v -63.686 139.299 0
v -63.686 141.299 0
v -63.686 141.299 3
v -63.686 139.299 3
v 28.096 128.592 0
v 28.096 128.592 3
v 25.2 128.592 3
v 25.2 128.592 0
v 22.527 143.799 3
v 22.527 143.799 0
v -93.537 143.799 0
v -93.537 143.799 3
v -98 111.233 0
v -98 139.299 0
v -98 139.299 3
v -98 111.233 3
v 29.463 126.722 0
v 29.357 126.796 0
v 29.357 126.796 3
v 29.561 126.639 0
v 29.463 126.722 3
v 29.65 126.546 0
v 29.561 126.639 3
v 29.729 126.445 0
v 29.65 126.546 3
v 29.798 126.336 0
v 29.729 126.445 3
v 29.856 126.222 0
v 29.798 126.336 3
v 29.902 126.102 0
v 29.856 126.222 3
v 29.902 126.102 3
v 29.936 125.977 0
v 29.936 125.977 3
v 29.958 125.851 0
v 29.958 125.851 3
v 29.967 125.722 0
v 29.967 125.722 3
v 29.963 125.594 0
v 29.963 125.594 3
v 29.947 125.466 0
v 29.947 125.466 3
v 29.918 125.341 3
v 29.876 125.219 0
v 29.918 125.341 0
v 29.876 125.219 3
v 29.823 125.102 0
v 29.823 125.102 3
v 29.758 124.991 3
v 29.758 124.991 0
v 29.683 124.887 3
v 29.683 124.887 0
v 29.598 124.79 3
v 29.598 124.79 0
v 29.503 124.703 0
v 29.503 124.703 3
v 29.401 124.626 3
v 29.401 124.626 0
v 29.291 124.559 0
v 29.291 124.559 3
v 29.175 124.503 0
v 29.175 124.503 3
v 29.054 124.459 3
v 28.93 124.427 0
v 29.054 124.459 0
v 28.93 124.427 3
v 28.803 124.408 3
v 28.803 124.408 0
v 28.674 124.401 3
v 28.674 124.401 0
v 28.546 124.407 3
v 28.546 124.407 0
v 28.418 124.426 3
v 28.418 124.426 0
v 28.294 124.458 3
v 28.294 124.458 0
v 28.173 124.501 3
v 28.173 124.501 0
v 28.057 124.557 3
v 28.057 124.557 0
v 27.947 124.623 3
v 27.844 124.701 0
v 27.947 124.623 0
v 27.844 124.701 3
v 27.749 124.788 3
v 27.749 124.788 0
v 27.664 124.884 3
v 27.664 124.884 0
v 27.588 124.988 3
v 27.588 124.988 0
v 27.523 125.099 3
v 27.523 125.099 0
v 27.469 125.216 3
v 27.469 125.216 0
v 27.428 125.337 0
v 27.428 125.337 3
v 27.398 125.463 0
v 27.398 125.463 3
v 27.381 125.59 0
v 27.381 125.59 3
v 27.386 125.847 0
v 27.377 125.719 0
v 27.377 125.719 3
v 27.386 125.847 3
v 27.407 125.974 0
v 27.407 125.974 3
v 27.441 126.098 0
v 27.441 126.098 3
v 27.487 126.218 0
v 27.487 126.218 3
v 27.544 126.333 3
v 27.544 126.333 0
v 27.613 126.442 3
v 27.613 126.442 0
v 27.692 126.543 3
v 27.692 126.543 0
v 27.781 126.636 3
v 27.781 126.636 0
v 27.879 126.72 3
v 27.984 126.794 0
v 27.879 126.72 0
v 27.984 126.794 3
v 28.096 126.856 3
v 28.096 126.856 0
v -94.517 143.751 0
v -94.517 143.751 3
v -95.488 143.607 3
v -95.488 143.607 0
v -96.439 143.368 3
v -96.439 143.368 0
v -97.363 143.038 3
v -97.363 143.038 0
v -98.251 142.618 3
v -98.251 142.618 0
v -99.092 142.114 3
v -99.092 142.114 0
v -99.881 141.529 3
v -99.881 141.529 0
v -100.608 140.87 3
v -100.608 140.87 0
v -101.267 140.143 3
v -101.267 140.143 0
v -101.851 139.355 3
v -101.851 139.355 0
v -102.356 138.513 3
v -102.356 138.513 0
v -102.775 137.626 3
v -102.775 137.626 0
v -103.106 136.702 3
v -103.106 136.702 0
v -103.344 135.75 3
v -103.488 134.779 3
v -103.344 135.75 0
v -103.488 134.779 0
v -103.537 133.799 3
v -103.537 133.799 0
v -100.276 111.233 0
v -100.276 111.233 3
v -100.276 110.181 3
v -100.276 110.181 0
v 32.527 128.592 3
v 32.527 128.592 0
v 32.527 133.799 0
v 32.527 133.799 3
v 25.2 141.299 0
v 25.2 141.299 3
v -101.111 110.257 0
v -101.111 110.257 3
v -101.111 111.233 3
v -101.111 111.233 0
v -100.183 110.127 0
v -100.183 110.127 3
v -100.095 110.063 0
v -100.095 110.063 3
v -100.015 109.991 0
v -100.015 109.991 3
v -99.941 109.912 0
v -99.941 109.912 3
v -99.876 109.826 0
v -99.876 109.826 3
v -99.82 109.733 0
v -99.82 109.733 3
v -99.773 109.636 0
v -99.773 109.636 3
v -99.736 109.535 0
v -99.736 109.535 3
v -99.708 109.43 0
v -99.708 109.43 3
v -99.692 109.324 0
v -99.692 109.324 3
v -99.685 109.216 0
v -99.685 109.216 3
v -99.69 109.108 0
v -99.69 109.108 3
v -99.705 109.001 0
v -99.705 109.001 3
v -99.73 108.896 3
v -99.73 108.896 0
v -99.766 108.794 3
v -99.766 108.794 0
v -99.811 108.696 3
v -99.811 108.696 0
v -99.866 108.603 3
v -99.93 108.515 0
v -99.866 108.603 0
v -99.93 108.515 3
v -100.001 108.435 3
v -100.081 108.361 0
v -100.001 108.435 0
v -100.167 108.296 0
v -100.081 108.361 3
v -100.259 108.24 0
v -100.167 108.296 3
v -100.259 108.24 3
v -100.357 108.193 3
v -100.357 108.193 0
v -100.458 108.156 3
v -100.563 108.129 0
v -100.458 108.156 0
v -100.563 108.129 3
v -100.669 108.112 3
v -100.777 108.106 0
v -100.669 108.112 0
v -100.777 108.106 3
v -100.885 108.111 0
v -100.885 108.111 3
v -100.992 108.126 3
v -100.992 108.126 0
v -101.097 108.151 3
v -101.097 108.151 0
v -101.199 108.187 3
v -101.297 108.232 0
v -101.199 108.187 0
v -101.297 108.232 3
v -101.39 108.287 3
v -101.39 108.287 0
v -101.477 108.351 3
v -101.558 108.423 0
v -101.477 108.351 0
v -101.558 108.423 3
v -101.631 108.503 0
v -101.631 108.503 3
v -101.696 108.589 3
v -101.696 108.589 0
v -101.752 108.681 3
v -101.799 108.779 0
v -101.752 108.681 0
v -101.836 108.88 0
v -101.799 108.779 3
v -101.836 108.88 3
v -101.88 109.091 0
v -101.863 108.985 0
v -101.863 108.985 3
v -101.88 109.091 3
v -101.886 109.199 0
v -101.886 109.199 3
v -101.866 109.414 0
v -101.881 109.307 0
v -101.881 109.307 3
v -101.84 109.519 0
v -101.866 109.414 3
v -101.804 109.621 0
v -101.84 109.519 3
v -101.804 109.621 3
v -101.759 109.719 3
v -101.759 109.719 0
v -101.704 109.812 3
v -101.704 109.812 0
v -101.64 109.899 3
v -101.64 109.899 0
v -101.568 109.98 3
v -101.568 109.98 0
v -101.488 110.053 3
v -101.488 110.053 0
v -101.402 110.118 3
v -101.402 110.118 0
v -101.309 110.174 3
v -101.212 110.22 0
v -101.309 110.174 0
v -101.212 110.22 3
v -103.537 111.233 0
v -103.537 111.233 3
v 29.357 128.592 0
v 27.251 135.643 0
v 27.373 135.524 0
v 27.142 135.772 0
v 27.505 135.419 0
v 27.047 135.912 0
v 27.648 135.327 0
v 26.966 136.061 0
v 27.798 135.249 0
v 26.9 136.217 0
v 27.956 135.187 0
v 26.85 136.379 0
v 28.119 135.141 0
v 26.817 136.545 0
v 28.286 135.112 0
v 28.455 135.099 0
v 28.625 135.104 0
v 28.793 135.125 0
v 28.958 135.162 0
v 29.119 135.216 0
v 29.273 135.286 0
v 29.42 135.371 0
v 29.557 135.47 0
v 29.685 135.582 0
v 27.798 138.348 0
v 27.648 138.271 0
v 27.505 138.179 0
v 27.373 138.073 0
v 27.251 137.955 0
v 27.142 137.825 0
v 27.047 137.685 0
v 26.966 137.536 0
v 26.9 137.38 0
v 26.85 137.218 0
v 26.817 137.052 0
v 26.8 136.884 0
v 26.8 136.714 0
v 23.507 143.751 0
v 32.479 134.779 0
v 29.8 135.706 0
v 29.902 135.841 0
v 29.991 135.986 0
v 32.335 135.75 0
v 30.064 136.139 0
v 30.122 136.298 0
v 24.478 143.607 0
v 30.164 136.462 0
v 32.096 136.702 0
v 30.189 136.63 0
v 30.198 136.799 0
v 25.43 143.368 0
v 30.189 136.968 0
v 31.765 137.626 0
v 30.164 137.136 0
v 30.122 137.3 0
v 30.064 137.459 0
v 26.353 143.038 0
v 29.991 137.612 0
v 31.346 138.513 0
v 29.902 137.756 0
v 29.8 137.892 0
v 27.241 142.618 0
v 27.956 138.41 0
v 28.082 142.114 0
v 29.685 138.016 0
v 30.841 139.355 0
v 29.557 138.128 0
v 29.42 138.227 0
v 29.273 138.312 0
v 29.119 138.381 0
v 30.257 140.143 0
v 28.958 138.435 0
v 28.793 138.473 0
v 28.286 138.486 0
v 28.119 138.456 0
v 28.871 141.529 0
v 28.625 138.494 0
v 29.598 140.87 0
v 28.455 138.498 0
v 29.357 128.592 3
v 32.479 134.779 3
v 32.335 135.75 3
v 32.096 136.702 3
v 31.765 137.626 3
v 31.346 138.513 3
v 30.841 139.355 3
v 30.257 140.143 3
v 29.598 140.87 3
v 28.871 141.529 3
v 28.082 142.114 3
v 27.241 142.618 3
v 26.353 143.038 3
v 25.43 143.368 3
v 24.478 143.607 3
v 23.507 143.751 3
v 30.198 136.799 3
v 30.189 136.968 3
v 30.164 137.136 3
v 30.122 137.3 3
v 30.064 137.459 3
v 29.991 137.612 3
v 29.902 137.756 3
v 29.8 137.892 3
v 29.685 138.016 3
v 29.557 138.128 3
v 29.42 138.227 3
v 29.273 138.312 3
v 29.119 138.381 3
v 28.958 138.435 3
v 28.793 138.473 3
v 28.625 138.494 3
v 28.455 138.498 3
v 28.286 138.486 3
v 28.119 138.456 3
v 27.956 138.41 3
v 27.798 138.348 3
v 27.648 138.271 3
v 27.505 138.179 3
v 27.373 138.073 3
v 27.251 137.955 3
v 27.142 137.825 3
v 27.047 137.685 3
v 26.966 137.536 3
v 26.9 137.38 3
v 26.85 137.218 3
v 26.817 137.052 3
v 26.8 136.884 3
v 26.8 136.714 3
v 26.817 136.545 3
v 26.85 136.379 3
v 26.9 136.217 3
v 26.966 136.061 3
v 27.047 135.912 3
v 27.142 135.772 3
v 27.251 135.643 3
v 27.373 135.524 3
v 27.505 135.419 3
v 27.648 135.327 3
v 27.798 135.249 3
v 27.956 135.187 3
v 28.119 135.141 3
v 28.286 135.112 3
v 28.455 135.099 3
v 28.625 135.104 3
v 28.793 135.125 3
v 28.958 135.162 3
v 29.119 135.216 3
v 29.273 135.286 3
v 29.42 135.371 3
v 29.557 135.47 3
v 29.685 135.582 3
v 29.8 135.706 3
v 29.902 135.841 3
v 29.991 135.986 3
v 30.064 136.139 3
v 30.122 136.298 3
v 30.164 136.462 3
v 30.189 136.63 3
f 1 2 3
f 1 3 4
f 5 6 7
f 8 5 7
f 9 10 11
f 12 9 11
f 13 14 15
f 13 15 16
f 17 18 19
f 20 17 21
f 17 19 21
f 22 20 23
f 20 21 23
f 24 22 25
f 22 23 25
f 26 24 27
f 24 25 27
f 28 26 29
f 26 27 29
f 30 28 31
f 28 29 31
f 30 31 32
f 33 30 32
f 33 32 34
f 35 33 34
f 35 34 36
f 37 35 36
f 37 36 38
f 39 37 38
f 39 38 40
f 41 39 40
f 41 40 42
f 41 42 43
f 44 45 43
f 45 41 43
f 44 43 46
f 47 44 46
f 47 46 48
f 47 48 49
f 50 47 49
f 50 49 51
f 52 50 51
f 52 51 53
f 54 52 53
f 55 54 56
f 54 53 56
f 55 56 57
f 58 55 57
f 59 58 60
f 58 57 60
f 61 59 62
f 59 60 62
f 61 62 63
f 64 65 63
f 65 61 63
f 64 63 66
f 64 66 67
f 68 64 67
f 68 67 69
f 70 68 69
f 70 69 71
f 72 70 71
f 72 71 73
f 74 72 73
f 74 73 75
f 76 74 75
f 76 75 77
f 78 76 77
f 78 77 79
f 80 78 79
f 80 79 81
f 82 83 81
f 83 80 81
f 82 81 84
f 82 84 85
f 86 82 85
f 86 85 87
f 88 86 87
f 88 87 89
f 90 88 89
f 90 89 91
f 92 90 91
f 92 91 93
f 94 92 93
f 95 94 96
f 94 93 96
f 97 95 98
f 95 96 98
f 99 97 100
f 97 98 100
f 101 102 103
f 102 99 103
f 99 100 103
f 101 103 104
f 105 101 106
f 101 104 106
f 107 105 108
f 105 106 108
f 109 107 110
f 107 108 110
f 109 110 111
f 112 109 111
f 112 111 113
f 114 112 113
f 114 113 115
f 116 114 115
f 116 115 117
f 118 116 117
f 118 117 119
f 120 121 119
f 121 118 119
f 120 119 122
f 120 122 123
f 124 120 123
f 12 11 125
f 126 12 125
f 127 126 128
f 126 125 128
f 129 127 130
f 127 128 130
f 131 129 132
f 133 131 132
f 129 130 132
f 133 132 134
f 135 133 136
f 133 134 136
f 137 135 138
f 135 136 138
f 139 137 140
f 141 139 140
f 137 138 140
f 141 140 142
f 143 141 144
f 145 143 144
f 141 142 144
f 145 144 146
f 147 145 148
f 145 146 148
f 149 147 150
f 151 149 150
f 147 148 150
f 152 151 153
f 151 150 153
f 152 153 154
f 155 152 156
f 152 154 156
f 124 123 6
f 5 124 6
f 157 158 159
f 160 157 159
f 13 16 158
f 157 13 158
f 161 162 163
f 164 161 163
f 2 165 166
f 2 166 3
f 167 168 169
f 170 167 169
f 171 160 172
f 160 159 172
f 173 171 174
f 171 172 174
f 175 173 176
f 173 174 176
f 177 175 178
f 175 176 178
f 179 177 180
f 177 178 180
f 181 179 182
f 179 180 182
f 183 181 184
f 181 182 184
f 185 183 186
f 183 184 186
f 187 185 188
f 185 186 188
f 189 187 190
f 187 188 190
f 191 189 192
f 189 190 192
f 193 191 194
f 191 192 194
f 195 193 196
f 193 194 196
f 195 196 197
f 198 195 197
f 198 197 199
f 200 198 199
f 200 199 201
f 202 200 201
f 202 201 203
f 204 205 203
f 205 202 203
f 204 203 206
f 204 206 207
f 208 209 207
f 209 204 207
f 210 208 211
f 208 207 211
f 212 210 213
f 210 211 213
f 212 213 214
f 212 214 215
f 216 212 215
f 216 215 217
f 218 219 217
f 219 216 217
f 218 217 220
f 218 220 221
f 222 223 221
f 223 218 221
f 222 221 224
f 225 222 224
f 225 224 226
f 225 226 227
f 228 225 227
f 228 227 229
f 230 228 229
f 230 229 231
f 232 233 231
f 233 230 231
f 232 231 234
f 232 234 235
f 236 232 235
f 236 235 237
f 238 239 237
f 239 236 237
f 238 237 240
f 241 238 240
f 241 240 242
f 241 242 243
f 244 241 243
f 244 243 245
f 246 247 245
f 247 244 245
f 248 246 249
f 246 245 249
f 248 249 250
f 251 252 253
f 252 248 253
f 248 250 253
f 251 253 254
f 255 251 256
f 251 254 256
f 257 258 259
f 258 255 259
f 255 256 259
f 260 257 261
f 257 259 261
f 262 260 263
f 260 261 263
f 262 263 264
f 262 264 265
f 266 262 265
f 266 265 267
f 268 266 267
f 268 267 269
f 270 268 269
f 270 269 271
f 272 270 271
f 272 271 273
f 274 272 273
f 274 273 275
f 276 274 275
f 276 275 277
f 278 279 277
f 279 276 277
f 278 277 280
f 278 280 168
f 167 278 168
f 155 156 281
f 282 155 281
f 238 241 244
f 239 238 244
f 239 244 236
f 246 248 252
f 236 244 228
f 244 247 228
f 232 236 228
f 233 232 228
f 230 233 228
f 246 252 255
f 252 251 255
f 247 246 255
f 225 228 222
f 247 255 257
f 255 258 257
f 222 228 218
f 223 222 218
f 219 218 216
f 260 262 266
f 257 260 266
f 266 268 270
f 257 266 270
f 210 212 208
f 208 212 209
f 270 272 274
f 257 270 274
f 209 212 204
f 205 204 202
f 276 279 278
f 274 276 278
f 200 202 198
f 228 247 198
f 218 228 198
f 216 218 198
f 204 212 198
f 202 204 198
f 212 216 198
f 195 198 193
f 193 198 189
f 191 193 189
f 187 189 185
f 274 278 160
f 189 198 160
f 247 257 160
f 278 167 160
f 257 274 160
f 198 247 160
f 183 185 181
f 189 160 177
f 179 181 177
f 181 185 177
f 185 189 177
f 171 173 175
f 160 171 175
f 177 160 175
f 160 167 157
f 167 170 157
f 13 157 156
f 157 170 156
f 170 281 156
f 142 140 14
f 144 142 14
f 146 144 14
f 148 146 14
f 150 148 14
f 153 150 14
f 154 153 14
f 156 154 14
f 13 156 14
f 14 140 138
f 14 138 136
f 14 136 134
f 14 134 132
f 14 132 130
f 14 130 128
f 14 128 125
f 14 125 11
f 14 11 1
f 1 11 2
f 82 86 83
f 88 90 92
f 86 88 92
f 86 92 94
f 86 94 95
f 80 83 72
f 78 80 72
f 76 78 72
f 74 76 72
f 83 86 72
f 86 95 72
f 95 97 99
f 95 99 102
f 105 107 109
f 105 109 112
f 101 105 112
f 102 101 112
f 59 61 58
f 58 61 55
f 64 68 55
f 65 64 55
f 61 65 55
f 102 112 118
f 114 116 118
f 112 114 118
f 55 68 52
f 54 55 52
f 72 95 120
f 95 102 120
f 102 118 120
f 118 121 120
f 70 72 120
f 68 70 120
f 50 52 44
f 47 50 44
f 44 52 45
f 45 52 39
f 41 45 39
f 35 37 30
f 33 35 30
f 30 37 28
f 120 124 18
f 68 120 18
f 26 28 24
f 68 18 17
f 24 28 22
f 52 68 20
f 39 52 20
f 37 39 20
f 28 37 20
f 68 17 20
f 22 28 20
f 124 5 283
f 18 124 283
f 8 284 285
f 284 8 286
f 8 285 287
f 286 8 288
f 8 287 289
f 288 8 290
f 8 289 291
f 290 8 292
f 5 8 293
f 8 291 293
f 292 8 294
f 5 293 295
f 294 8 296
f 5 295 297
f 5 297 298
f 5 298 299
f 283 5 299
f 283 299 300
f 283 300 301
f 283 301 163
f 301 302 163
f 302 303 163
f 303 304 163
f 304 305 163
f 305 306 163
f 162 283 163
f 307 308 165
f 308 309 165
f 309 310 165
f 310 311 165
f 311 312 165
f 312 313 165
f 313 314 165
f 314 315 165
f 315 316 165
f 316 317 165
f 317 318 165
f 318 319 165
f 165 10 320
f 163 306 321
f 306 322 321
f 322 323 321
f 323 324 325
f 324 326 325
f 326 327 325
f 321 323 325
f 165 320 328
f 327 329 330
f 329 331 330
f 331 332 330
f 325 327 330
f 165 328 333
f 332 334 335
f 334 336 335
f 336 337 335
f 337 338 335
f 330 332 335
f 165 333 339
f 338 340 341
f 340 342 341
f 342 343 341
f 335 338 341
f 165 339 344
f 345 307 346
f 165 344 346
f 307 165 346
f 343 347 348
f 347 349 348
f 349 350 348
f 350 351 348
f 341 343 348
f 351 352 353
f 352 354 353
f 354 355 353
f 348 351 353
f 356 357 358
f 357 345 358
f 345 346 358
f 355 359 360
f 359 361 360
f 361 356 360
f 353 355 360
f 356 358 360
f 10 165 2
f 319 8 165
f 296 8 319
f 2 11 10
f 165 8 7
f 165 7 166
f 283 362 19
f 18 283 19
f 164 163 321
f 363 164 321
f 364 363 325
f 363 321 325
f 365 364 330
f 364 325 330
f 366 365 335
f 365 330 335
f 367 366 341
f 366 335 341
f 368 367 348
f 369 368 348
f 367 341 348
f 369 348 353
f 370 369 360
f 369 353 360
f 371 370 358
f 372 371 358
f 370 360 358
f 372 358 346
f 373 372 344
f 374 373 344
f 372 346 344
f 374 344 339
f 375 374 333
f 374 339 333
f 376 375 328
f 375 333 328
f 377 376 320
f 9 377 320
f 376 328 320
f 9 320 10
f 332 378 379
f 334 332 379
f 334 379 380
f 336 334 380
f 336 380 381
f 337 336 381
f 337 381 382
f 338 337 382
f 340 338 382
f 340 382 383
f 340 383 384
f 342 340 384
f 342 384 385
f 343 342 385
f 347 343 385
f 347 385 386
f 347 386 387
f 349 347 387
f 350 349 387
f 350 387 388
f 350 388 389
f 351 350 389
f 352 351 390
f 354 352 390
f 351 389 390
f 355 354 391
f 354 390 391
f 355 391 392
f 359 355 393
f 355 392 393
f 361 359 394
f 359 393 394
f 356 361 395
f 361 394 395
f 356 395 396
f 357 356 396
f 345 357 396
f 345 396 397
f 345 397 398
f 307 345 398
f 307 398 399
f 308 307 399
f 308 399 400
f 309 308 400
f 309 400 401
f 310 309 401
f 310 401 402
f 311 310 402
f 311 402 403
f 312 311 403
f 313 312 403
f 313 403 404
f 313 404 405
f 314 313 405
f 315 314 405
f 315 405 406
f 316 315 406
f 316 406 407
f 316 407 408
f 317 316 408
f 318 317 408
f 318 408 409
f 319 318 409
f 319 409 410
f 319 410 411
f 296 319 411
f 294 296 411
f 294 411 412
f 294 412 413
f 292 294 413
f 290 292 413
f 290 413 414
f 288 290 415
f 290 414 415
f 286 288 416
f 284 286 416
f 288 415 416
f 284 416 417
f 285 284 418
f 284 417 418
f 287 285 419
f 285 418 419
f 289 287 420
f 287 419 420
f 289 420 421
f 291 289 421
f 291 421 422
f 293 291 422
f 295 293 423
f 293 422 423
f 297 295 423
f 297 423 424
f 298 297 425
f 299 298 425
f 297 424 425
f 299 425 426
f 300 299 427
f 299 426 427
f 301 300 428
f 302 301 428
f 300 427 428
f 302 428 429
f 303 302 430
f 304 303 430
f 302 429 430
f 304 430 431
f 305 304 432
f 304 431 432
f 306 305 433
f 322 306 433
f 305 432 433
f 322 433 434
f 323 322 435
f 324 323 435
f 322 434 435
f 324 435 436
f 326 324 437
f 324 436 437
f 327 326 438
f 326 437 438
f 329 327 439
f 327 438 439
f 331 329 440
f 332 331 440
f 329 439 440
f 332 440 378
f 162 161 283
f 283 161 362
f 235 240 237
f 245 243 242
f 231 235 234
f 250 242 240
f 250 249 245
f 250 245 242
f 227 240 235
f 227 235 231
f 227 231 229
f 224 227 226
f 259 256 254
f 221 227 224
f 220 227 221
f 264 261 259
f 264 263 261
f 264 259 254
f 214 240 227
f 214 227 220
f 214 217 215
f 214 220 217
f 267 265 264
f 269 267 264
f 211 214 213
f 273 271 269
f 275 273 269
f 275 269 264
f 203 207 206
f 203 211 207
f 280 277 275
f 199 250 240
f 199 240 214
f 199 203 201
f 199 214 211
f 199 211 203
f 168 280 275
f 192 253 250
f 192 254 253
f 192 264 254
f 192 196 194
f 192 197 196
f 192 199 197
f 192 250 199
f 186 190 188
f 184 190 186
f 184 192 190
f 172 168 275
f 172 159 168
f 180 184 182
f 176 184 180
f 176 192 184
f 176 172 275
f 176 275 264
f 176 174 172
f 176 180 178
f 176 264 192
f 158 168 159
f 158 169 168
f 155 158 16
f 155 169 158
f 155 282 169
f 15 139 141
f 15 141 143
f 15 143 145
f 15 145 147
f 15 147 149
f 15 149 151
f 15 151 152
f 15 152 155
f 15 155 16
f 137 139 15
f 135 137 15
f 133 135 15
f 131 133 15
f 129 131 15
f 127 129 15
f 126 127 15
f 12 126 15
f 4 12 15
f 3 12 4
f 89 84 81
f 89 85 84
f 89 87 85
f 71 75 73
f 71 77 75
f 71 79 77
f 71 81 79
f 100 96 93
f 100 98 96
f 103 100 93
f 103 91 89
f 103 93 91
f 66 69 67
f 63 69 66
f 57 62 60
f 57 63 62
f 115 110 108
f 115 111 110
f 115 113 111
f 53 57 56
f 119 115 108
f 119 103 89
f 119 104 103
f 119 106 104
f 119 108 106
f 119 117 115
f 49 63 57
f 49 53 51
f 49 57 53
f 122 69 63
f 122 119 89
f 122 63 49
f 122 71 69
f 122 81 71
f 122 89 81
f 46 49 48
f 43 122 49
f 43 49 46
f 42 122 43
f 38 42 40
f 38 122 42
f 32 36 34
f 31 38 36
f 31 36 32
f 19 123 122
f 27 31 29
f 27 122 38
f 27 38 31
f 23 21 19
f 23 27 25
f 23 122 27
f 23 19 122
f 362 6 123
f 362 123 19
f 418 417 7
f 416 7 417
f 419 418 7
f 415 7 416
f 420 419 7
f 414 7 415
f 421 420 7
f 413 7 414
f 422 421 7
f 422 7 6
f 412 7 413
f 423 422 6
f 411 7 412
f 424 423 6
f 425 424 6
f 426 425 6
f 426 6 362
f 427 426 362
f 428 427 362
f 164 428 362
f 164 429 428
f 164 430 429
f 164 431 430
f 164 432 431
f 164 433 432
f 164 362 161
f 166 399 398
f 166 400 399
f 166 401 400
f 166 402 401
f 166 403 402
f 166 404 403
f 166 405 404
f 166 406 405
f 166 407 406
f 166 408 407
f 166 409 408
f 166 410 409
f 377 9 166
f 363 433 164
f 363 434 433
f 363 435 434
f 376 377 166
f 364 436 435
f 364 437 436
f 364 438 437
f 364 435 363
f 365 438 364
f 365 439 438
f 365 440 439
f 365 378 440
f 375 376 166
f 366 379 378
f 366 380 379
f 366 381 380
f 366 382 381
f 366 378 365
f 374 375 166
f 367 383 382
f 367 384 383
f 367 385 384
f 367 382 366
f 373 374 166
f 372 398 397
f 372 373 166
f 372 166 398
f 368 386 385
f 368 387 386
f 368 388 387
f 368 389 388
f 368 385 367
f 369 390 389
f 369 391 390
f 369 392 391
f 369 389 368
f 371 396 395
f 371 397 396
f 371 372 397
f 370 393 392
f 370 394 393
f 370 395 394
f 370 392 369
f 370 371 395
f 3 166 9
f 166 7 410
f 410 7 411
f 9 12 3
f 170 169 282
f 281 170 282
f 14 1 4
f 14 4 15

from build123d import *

# Parameters (mm, degrees)
BOSS_EXTRUDE1_DEPTH  = 3
M3_CLEARANCE_HOLE1_D = 3.4
SKETCH2_OUTSIDE_W    = 168.672
SKETCH2_OUTSIDE_H    = 102.608
CUT_EXTRUDE1_DEPTH   = 10


with BuildPart() as part:
    # Sketch1 → Boss-Extrude1 (new body)
    with BuildSketch(Plane.XY):
        with BuildLine():
            Line((-93.536600288, 73.798841742), (22.52665856, 73.798841742))
            ThreePointArc((22.52665856, 73.798841742), (29.597726372, 76.72777393), (32.52665856, 83.798841742))
            Line((32.52665856, 83.798841742), (32.52665856, 133.798841742))
            ThreePointArc((32.52665856, 133.798841742), (29.597726372, 140.869909554), (22.52665856, 143.798841742))
            Line((22.52665856, 143.798841742), (-93.536600288, 143.798841742))
            ThreePointArc((-93.536600288, 143.798841742), (-100.6076681, 140.869909554), (-103.536600288, 133.798841742))
            Line((-103.536600288, 133.798841742), (-103.536600288, 83.798841742))
            ThreePointArc((-103.536600288, 83.798841742), (-100.6076681, 76.72777393), (-93.536600288, 73.798841742))
        make_face()
        Polygon((7.241251279, 79.113754803), (7.241251279, 115.298841742), (25.200464445, 115.298841742), (25.200464445, 141.298841742), (-63.686125174, 141.298841742), (-63.686125174, 139.298841742), (-98, 139.298841742), (-98, 79.113754803), align=None, mode=Mode.SUBTRACT)
    extrude(amount=BOSS_EXTRUDE1_DEPTH)

    # M3 Clearance Hole1 (through all)
    with Locations(Plane(origin=(0, 0, 0), x_dir=(-1, 0, 0), z_dir=(0, 0, -1))):
        with Locations((-28.497536526, 136.798841742), (-28.497536526, 81.798841742)):
            Hole(M3_CLEARANCE_HOLE1_D / 2)

    # Sketch2 outside → Cut-Extrude1 (cut)
    with BuildSketch(Plane.XY.offset(3)):
        with Locations((-35.505, 108.799)):
            Rectangle(SKETCH2_OUTSIDE_W, SKETCH2_OUTSIDE_H)
        with BuildLine():
            Line((-98, 111.232980273), (-100.276015927, 111.232980273))
            Line((-100.276015927, 111.232980273), (-100.276015927, 110.181279495))
            ThreePointArc((-100.276015927, 110.181279495), (-100.885260547, 108.11074669), (-101.110575194, 110.257259772))
            Line((-101.110575194, 110.257259772), (-101.110575194, 111.232980273))
            Line((-101.110575194, 111.232980273), (-103.536600288, 111.232980273))
            Line((-103.536600288, 111.232980273), (-103.536600288, 155.169137996))
            Line((-103.536600288, 155.169137996), (37.520914888, 146.495442913))
            Line((37.520914888, 146.495442913), (36.419995989, 128.591552724))
            Line((36.419995989, 128.591552724), (32.52665856, 128.591552724))
            Line((32.52665856, 128.591552724), (29.357018022, 128.591552724))
            Line((29.357018022, 128.591552724), (29.357018022, 126.79555932))
            ThreePointArc((29.357018022, 126.79555932), (28.609769319, 124.402587901), (28.09640217, 126.856390462))
            Line((28.09640217, 126.856390462), (28.09640217, 128.591552724))
            Line((28.09640217, 128.591552724), (25.200464445, 128.591552724))
            Line((25.200464445, 128.591552724), (-98, 111.232980273))
        make_face(mode=Mode.SUBTRACT)
    extrude(amount=-CUT_EXTRUDE1_DEPTH, mode=Mode.SUBTRACT)


solid = part.part
